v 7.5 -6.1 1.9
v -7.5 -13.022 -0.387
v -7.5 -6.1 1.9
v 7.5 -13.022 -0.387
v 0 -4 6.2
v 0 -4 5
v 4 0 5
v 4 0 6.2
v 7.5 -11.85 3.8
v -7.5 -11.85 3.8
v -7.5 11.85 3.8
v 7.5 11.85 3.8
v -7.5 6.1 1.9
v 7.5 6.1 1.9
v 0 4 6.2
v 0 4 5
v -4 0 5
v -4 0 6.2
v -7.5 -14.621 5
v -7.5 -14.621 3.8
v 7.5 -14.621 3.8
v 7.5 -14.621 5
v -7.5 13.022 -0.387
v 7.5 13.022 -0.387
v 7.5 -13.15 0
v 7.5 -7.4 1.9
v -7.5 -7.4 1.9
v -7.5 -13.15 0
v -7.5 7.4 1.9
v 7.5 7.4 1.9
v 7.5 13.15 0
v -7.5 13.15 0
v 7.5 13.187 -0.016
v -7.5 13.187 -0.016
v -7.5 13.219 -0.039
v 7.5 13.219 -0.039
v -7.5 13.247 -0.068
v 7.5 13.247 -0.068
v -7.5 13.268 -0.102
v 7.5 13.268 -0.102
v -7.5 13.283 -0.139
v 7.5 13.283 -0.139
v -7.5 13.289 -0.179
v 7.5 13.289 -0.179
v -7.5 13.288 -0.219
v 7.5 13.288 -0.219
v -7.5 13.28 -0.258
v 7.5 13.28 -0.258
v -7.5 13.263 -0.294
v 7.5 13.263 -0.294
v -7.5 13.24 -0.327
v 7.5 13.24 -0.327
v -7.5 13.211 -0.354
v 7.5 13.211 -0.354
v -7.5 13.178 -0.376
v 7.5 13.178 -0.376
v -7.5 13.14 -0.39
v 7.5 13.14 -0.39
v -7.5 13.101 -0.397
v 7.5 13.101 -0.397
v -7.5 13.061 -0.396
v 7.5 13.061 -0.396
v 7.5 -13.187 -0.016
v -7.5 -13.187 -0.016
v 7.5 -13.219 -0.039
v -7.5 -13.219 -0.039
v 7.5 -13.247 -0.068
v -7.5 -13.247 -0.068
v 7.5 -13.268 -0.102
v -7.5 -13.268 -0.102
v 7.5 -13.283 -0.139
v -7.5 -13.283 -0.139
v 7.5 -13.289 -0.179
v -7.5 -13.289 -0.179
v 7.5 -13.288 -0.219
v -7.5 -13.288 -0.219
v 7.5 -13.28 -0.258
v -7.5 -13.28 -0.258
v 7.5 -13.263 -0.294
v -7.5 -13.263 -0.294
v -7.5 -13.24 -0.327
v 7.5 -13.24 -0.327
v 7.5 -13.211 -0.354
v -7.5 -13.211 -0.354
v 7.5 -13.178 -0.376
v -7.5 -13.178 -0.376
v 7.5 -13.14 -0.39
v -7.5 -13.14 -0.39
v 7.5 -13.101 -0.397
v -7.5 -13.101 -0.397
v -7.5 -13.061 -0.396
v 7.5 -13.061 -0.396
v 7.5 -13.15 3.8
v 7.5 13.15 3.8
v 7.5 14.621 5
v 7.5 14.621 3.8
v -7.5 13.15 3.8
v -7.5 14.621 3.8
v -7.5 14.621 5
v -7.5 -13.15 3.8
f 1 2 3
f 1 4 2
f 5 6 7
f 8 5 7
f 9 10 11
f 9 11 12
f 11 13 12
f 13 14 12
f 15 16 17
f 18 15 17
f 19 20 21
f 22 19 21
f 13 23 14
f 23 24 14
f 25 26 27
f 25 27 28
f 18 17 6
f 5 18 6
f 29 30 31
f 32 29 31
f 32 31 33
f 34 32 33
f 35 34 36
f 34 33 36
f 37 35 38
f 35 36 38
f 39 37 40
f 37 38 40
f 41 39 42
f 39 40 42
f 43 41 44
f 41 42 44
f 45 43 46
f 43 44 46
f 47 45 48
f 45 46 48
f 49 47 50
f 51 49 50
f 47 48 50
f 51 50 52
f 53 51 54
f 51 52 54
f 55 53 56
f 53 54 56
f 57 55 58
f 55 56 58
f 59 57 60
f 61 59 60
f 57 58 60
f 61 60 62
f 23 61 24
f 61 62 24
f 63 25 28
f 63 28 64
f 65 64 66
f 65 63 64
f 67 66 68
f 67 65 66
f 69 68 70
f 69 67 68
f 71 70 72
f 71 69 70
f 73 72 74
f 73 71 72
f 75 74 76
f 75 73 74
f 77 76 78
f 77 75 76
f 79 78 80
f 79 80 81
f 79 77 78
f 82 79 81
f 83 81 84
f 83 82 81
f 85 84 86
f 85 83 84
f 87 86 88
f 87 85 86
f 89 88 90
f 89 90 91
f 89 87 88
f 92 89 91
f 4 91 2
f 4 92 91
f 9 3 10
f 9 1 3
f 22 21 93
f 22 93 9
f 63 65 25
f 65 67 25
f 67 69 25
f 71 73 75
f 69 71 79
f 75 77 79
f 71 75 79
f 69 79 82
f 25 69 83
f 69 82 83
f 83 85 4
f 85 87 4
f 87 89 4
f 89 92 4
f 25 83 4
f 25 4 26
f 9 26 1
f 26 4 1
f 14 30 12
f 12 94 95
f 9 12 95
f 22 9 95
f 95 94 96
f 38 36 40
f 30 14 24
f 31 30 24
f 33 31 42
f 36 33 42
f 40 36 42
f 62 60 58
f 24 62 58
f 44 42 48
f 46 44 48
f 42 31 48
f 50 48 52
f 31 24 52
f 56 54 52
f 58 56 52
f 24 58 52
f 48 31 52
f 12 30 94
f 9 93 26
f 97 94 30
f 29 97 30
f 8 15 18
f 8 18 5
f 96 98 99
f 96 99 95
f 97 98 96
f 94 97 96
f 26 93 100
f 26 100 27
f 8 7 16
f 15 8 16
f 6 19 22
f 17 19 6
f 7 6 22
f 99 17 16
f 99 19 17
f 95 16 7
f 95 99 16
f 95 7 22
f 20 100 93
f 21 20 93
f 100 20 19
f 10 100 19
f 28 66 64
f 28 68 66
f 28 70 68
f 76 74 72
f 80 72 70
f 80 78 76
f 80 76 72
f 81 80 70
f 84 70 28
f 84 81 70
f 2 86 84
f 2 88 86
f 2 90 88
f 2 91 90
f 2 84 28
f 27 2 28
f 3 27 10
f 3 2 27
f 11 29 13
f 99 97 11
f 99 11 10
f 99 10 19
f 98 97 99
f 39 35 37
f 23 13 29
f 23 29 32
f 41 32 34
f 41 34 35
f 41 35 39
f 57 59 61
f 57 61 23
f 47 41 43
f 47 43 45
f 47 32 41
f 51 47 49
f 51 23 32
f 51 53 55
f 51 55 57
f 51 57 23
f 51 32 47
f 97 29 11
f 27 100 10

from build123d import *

# Parameters (mm, degrees)
PAD011_DEPTH = 7.5
SKETCH014_W  = 15
SKETCH014_H  = 29.2426
PAD012_DEPTH = 1.2
PAD013_DEPTH = 1.2


with BuildPart() as part:
    # Sketch015 → Pad011 (new body, symmetric)
    with BuildSketch(Plane.YZ):
        with BuildLine():
            Line((-11.85, 3.8), (-13.15, 3.8))
            Line((-13.15, 3.8), (-7.4, 1.9))
            Line((-7.4, 1.9), (-13.15, 0))
            ThreePointArc((-13.15, 0), (-13.279654, -0.257625), (-13.022029, -0.387279))
            Line((-13.022029, -0.387279), (-6.1, 1.9))
            Line((-6.1, 1.9), (-11.85, 3.8))
        make_face()
    pad011 = extrude(amount=PAD011_DEPTH, both=True)

    # Sketch014 (on DatumPlane) → Pad012 (join)
    with BuildSketch(Plane.XY.offset(3.8)):
        Rectangle(SKETCH014_W, SKETCH014_H)
    extrude(amount=PAD012_DEPTH)

    # Mirrored002: Pad011 across Sketch015 V_Axis
    add(pad011.mirror(Plane(origin=(0, 0, 0), x_dir=(1, 0, 0), z_dir=(0, 1, 0))))

    # Sketch018 → Pad013 (join)
    with BuildSketch(Plane.XY.offset(5)):
        Polygon((4, 0), (0, 4), (-4, 0), (0, -4), align=None)
    extrude(amount=PAD013_DEPTH)


solid = part.part
